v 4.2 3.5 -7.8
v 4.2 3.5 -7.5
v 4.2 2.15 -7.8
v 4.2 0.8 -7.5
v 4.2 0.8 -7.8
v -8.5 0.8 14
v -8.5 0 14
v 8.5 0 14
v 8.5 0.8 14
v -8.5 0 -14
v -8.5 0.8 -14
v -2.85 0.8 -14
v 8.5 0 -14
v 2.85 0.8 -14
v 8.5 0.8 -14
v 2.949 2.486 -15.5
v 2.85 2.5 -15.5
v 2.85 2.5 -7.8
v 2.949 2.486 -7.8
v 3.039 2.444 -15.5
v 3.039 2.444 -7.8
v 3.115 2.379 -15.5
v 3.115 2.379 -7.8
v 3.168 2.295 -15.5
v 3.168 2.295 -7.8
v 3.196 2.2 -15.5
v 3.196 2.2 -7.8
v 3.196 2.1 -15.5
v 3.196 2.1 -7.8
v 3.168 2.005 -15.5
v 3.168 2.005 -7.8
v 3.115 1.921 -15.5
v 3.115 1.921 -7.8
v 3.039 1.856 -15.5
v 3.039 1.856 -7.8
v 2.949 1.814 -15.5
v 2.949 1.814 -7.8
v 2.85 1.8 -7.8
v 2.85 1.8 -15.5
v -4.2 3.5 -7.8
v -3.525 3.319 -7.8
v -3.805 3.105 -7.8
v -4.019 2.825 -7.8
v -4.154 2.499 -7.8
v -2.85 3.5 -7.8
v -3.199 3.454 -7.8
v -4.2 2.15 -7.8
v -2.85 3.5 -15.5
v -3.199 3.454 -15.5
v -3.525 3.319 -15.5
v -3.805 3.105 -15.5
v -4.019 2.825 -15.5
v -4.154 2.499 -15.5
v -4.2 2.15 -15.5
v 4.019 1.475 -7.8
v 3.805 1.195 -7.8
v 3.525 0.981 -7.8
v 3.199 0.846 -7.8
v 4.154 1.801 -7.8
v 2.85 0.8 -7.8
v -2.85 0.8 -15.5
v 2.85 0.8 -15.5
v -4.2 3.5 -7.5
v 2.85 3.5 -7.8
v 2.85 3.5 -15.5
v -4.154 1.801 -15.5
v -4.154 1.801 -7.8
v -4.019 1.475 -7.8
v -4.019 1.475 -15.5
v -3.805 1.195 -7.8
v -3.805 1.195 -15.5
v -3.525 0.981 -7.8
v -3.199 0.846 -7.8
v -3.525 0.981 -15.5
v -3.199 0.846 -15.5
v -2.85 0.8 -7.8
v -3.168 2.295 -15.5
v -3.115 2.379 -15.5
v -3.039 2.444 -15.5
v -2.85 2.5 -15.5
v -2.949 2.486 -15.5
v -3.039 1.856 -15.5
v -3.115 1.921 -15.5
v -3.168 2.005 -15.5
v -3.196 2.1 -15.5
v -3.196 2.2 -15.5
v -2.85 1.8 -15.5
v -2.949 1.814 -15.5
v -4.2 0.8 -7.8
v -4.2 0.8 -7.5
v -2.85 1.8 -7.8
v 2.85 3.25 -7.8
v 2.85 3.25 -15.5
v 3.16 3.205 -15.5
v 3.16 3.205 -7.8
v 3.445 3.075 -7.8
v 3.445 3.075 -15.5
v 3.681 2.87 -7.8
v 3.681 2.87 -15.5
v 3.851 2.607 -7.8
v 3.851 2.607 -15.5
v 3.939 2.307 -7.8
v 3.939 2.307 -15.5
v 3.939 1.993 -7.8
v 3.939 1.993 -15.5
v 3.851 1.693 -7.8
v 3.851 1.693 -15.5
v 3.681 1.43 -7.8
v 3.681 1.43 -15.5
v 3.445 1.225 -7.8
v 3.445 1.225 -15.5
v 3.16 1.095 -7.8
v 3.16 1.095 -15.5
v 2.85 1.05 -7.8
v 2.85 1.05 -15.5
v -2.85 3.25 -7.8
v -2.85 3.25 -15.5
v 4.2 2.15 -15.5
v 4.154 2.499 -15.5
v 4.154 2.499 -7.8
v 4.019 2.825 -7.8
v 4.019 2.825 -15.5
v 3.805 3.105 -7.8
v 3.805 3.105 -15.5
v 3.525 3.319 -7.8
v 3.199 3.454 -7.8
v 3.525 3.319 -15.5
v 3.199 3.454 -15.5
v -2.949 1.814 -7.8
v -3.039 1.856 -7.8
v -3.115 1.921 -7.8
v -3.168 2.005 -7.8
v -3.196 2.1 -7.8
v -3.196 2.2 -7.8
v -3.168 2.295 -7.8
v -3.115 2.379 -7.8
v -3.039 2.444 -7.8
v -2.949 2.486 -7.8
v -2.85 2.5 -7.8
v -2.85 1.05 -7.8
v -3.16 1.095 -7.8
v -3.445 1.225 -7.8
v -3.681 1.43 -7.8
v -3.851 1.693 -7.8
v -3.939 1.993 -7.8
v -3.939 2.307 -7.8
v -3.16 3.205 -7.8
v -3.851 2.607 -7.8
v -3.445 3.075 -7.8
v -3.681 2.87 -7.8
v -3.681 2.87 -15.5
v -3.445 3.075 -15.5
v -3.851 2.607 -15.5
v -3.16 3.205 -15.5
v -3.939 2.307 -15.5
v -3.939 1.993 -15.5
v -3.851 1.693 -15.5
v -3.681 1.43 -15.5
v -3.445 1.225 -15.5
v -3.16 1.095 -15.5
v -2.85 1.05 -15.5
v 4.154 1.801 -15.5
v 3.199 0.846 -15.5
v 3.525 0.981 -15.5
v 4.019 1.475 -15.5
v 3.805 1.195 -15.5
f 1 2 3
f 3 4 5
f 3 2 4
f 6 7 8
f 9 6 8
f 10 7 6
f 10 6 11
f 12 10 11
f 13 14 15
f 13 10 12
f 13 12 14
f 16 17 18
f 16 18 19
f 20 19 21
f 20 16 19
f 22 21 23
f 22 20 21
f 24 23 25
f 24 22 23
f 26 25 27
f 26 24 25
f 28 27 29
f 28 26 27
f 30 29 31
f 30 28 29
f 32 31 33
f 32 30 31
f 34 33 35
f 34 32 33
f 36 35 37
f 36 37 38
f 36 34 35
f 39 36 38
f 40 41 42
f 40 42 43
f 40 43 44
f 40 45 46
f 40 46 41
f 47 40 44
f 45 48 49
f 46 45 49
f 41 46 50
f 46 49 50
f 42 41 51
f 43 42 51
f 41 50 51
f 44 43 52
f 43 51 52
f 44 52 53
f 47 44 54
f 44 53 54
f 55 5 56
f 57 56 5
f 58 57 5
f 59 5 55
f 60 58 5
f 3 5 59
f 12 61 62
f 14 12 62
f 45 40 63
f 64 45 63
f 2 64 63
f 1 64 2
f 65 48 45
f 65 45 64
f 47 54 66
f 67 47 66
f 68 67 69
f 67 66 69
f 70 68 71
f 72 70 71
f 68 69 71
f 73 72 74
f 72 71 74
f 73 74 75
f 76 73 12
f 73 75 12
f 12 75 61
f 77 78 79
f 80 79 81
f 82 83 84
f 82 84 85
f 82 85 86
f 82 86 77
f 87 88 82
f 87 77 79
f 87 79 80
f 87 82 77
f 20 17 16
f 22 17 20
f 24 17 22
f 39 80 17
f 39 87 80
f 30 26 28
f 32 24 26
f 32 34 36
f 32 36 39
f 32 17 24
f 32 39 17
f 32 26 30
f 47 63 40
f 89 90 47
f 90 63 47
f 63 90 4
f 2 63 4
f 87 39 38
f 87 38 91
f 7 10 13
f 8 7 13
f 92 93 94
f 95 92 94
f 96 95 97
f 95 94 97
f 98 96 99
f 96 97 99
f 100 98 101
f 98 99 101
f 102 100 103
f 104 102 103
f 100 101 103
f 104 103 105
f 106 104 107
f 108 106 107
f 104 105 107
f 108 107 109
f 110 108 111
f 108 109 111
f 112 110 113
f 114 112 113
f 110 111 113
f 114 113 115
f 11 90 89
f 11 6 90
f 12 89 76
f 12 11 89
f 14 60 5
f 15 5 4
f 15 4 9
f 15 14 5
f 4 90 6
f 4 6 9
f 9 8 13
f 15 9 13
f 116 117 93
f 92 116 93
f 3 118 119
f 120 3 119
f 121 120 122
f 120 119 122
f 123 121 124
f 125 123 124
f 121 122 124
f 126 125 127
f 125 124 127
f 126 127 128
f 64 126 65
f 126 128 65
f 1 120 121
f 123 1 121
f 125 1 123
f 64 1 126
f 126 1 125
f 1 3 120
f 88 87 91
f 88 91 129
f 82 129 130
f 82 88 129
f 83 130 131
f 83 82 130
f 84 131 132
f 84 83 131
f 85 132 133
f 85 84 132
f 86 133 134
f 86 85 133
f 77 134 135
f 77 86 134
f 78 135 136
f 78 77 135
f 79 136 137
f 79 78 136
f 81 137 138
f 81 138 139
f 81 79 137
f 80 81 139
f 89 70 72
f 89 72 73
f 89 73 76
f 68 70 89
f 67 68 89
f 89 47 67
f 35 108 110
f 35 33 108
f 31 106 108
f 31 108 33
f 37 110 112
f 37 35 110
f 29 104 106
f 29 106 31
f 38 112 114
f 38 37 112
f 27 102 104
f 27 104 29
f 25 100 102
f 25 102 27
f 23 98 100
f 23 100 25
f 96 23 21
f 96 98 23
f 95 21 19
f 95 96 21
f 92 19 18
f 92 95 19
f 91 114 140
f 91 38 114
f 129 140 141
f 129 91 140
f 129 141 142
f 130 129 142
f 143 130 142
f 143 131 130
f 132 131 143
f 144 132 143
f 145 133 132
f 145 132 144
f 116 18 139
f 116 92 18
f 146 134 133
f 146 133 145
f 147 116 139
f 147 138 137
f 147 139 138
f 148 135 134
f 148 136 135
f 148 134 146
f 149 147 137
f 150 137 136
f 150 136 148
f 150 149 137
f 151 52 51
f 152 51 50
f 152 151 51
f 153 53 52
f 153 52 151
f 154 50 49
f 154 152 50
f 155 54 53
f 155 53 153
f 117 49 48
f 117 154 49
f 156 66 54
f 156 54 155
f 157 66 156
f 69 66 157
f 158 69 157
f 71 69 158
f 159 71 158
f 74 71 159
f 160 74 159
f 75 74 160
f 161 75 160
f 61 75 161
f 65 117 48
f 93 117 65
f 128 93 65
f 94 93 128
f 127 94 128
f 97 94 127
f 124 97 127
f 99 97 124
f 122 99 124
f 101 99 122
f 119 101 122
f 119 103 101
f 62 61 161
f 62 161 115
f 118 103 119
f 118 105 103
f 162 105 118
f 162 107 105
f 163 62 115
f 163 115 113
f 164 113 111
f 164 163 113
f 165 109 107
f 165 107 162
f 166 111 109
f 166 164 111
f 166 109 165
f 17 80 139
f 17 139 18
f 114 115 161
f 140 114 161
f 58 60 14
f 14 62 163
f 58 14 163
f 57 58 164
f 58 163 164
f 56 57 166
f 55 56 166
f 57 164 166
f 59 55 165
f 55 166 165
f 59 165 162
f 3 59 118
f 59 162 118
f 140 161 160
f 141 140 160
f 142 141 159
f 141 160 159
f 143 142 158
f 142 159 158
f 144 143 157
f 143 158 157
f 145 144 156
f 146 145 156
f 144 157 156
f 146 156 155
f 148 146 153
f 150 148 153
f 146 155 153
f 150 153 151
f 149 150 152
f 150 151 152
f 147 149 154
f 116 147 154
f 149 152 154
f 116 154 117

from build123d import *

# Parameters (mm, degrees)
SKETCH1_W           = 17
SKETCH1_H           = 28
BOSS_EXTRUDE1_DEPTH = 0.8
SKETCH3_W           = 8.4
SKETCH3_H           = 8
BOSS_EXTRUDE2_DEPTH = 2.7
CUT_EXTRUDE1_DEPTH  = 7.7


with BuildPart() as part:
    # Sketch1 → Boss-Extrude1 (new body)
    with BuildSketch(Plane(origin=(0, 0, 0), x_dir=(1, 0, 0), z_dir=(0, 1, 0))):
        Rectangle(SKETCH1_W, SKETCH1_H)
    extrude(amount=BOSS_EXTRUDE1_DEPTH)

    # Sketch3 → Boss-Extrude2 (add)
    with BuildSketch(Plane(origin=(0, 0.8, 0), x_dir=(1, 0, 0), z_dir=(0, 1, 0))):
        with Locations((0, 11.5)):
            Rectangle(SKETCH3_W, SKETCH3_H)
    extrude(amount=BOSS_EXTRUDE2_DEPTH)

    # Sketch4 → Cut-Extrude1 (cut)
    with BuildSketch(Plane(origin=(0, 0, -15.5), x_dir=(-1, 0, 0), z_dir=(0, 0, -1))):
        with BuildLine():
            ThreePointArc((-4.2, 2.15), (-3.804594155, 3.104594155), (-2.85, 3.5))
            Line((-2.85, 3.5), (-4.2, 3.5))
            Line((-4.2, 3.5), (-4.2, 2.15))
        make_face()
        with BuildLine():
            ThreePointArc((-2.85, 0.8), (-3.804594155, 1.195405845), (-4.2, 2.15))
            Line((-4.2, 2.15), (-4.2, 0.8))
            Line((-4.2, 0.8), (-2.85, 0.8))
        make_face()
        with BuildLine():
            Line((4.2, 0.8), (4.2, 2.15))
            ThreePointArc((4.2, 2.15), (3.804594155, 1.195405845), (2.85, 0.8))
            Line((2.85, 0.8), (4.2, 0.8))
        make_face()
        with BuildLine():
            Line((4.2, 3.5), (2.85, 3.5))
            ThreePointArc((2.85, 3.5), (3.804594155, 3.104594155), (4.2, 2.15))
            Line((4.2, 2.15), (4.2, 3.5))
        make_face()
        with BuildLine():
            Line((-2.85, 1.05), (2.85, 1.05))
            ThreePointArc((2.85, 1.05), (3.95, 2.15), (2.85, 3.25))
            Line((2.85, 3.25), (-2.85, 3.25))
            ThreePointArc((-2.85, 3.25), (-3.95, 2.15), (-2.85, 1.05))
        make_face()
        with BuildLine():
            ThreePointArc((2.85, 1.8), (3.2, 2.15), (2.85, 2.5))
            Line((2.85, 2.5), (-2.85, 2.5))
            ThreePointArc((-2.85, 2.5), (-3.2, 2.15), (-2.85, 1.8))
            Line((-2.85, 1.8), (2.85, 1.8))
        make_face(mode=Mode.SUBTRACT)
    extrude(amount=-CUT_EXTRUDE1_DEPTH, mode=Mode.SUBTRACT)


solid = part.part
